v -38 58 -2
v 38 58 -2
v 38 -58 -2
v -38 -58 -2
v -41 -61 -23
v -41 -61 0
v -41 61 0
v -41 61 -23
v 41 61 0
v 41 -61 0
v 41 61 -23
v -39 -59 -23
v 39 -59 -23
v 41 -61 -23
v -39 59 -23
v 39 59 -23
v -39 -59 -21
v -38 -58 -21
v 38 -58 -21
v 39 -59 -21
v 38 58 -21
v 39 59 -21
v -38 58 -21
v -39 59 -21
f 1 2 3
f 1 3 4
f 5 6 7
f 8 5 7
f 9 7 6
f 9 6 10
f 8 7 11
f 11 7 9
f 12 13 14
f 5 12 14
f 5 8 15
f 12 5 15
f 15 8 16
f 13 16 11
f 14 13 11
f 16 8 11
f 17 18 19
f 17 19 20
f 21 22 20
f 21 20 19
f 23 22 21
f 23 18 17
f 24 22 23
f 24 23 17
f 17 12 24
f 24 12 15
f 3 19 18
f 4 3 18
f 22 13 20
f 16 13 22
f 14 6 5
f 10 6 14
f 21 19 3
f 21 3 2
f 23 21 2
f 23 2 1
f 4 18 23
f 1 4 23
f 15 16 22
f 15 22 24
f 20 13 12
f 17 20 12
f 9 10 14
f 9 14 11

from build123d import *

# Parameters (mm, degrees)
SKETCH1_W           = 82
SKETCH1_H           = 122
BOSS_EXTRUDE1_DEPTH = 23
SKETCH2_W           = 76
SKETCH2_H           = 116
CUT_EXTRUDE1_DEPTH  = 21
SKETCH6_W           = 78
SKETCH6_H           = 118
CUT_EXTRUDE3_DEPTH  = 2


with BuildPart() as part:
    # Sketch1 → Boss-Extrude1 (new body)
    with BuildSketch(Plane.XY):
        Rectangle(SKETCH1_W, SKETCH1_H)
    extrude(amount=-BOSS_EXTRUDE1_DEPTH)

    # Sketch2 → Cut-Extrude1 (cut)
    with BuildSketch(Plane(origin=(0, 0, -23), x_dir=(-1, 0, 0), z_dir=(0, 0, -1))):
        Rectangle(SKETCH2_W, SKETCH2_H)
    extrude(amount=-CUT_EXTRUDE1_DEPTH, mode=Mode.SUBTRACT)

    # Sketch6 → Cut-Extrude3 (cut)
    with BuildSketch(Plane(origin=(0, 0, -23), x_dir=(-1, 0, 0), z_dir=(0, 0, -1))):
        Rectangle(SKETCH6_W, SKETCH6_H)
    extrude(amount=-CUT_EXTRUDE3_DEPTH, mode=Mode.SUBTRACT)


solid = part.part
